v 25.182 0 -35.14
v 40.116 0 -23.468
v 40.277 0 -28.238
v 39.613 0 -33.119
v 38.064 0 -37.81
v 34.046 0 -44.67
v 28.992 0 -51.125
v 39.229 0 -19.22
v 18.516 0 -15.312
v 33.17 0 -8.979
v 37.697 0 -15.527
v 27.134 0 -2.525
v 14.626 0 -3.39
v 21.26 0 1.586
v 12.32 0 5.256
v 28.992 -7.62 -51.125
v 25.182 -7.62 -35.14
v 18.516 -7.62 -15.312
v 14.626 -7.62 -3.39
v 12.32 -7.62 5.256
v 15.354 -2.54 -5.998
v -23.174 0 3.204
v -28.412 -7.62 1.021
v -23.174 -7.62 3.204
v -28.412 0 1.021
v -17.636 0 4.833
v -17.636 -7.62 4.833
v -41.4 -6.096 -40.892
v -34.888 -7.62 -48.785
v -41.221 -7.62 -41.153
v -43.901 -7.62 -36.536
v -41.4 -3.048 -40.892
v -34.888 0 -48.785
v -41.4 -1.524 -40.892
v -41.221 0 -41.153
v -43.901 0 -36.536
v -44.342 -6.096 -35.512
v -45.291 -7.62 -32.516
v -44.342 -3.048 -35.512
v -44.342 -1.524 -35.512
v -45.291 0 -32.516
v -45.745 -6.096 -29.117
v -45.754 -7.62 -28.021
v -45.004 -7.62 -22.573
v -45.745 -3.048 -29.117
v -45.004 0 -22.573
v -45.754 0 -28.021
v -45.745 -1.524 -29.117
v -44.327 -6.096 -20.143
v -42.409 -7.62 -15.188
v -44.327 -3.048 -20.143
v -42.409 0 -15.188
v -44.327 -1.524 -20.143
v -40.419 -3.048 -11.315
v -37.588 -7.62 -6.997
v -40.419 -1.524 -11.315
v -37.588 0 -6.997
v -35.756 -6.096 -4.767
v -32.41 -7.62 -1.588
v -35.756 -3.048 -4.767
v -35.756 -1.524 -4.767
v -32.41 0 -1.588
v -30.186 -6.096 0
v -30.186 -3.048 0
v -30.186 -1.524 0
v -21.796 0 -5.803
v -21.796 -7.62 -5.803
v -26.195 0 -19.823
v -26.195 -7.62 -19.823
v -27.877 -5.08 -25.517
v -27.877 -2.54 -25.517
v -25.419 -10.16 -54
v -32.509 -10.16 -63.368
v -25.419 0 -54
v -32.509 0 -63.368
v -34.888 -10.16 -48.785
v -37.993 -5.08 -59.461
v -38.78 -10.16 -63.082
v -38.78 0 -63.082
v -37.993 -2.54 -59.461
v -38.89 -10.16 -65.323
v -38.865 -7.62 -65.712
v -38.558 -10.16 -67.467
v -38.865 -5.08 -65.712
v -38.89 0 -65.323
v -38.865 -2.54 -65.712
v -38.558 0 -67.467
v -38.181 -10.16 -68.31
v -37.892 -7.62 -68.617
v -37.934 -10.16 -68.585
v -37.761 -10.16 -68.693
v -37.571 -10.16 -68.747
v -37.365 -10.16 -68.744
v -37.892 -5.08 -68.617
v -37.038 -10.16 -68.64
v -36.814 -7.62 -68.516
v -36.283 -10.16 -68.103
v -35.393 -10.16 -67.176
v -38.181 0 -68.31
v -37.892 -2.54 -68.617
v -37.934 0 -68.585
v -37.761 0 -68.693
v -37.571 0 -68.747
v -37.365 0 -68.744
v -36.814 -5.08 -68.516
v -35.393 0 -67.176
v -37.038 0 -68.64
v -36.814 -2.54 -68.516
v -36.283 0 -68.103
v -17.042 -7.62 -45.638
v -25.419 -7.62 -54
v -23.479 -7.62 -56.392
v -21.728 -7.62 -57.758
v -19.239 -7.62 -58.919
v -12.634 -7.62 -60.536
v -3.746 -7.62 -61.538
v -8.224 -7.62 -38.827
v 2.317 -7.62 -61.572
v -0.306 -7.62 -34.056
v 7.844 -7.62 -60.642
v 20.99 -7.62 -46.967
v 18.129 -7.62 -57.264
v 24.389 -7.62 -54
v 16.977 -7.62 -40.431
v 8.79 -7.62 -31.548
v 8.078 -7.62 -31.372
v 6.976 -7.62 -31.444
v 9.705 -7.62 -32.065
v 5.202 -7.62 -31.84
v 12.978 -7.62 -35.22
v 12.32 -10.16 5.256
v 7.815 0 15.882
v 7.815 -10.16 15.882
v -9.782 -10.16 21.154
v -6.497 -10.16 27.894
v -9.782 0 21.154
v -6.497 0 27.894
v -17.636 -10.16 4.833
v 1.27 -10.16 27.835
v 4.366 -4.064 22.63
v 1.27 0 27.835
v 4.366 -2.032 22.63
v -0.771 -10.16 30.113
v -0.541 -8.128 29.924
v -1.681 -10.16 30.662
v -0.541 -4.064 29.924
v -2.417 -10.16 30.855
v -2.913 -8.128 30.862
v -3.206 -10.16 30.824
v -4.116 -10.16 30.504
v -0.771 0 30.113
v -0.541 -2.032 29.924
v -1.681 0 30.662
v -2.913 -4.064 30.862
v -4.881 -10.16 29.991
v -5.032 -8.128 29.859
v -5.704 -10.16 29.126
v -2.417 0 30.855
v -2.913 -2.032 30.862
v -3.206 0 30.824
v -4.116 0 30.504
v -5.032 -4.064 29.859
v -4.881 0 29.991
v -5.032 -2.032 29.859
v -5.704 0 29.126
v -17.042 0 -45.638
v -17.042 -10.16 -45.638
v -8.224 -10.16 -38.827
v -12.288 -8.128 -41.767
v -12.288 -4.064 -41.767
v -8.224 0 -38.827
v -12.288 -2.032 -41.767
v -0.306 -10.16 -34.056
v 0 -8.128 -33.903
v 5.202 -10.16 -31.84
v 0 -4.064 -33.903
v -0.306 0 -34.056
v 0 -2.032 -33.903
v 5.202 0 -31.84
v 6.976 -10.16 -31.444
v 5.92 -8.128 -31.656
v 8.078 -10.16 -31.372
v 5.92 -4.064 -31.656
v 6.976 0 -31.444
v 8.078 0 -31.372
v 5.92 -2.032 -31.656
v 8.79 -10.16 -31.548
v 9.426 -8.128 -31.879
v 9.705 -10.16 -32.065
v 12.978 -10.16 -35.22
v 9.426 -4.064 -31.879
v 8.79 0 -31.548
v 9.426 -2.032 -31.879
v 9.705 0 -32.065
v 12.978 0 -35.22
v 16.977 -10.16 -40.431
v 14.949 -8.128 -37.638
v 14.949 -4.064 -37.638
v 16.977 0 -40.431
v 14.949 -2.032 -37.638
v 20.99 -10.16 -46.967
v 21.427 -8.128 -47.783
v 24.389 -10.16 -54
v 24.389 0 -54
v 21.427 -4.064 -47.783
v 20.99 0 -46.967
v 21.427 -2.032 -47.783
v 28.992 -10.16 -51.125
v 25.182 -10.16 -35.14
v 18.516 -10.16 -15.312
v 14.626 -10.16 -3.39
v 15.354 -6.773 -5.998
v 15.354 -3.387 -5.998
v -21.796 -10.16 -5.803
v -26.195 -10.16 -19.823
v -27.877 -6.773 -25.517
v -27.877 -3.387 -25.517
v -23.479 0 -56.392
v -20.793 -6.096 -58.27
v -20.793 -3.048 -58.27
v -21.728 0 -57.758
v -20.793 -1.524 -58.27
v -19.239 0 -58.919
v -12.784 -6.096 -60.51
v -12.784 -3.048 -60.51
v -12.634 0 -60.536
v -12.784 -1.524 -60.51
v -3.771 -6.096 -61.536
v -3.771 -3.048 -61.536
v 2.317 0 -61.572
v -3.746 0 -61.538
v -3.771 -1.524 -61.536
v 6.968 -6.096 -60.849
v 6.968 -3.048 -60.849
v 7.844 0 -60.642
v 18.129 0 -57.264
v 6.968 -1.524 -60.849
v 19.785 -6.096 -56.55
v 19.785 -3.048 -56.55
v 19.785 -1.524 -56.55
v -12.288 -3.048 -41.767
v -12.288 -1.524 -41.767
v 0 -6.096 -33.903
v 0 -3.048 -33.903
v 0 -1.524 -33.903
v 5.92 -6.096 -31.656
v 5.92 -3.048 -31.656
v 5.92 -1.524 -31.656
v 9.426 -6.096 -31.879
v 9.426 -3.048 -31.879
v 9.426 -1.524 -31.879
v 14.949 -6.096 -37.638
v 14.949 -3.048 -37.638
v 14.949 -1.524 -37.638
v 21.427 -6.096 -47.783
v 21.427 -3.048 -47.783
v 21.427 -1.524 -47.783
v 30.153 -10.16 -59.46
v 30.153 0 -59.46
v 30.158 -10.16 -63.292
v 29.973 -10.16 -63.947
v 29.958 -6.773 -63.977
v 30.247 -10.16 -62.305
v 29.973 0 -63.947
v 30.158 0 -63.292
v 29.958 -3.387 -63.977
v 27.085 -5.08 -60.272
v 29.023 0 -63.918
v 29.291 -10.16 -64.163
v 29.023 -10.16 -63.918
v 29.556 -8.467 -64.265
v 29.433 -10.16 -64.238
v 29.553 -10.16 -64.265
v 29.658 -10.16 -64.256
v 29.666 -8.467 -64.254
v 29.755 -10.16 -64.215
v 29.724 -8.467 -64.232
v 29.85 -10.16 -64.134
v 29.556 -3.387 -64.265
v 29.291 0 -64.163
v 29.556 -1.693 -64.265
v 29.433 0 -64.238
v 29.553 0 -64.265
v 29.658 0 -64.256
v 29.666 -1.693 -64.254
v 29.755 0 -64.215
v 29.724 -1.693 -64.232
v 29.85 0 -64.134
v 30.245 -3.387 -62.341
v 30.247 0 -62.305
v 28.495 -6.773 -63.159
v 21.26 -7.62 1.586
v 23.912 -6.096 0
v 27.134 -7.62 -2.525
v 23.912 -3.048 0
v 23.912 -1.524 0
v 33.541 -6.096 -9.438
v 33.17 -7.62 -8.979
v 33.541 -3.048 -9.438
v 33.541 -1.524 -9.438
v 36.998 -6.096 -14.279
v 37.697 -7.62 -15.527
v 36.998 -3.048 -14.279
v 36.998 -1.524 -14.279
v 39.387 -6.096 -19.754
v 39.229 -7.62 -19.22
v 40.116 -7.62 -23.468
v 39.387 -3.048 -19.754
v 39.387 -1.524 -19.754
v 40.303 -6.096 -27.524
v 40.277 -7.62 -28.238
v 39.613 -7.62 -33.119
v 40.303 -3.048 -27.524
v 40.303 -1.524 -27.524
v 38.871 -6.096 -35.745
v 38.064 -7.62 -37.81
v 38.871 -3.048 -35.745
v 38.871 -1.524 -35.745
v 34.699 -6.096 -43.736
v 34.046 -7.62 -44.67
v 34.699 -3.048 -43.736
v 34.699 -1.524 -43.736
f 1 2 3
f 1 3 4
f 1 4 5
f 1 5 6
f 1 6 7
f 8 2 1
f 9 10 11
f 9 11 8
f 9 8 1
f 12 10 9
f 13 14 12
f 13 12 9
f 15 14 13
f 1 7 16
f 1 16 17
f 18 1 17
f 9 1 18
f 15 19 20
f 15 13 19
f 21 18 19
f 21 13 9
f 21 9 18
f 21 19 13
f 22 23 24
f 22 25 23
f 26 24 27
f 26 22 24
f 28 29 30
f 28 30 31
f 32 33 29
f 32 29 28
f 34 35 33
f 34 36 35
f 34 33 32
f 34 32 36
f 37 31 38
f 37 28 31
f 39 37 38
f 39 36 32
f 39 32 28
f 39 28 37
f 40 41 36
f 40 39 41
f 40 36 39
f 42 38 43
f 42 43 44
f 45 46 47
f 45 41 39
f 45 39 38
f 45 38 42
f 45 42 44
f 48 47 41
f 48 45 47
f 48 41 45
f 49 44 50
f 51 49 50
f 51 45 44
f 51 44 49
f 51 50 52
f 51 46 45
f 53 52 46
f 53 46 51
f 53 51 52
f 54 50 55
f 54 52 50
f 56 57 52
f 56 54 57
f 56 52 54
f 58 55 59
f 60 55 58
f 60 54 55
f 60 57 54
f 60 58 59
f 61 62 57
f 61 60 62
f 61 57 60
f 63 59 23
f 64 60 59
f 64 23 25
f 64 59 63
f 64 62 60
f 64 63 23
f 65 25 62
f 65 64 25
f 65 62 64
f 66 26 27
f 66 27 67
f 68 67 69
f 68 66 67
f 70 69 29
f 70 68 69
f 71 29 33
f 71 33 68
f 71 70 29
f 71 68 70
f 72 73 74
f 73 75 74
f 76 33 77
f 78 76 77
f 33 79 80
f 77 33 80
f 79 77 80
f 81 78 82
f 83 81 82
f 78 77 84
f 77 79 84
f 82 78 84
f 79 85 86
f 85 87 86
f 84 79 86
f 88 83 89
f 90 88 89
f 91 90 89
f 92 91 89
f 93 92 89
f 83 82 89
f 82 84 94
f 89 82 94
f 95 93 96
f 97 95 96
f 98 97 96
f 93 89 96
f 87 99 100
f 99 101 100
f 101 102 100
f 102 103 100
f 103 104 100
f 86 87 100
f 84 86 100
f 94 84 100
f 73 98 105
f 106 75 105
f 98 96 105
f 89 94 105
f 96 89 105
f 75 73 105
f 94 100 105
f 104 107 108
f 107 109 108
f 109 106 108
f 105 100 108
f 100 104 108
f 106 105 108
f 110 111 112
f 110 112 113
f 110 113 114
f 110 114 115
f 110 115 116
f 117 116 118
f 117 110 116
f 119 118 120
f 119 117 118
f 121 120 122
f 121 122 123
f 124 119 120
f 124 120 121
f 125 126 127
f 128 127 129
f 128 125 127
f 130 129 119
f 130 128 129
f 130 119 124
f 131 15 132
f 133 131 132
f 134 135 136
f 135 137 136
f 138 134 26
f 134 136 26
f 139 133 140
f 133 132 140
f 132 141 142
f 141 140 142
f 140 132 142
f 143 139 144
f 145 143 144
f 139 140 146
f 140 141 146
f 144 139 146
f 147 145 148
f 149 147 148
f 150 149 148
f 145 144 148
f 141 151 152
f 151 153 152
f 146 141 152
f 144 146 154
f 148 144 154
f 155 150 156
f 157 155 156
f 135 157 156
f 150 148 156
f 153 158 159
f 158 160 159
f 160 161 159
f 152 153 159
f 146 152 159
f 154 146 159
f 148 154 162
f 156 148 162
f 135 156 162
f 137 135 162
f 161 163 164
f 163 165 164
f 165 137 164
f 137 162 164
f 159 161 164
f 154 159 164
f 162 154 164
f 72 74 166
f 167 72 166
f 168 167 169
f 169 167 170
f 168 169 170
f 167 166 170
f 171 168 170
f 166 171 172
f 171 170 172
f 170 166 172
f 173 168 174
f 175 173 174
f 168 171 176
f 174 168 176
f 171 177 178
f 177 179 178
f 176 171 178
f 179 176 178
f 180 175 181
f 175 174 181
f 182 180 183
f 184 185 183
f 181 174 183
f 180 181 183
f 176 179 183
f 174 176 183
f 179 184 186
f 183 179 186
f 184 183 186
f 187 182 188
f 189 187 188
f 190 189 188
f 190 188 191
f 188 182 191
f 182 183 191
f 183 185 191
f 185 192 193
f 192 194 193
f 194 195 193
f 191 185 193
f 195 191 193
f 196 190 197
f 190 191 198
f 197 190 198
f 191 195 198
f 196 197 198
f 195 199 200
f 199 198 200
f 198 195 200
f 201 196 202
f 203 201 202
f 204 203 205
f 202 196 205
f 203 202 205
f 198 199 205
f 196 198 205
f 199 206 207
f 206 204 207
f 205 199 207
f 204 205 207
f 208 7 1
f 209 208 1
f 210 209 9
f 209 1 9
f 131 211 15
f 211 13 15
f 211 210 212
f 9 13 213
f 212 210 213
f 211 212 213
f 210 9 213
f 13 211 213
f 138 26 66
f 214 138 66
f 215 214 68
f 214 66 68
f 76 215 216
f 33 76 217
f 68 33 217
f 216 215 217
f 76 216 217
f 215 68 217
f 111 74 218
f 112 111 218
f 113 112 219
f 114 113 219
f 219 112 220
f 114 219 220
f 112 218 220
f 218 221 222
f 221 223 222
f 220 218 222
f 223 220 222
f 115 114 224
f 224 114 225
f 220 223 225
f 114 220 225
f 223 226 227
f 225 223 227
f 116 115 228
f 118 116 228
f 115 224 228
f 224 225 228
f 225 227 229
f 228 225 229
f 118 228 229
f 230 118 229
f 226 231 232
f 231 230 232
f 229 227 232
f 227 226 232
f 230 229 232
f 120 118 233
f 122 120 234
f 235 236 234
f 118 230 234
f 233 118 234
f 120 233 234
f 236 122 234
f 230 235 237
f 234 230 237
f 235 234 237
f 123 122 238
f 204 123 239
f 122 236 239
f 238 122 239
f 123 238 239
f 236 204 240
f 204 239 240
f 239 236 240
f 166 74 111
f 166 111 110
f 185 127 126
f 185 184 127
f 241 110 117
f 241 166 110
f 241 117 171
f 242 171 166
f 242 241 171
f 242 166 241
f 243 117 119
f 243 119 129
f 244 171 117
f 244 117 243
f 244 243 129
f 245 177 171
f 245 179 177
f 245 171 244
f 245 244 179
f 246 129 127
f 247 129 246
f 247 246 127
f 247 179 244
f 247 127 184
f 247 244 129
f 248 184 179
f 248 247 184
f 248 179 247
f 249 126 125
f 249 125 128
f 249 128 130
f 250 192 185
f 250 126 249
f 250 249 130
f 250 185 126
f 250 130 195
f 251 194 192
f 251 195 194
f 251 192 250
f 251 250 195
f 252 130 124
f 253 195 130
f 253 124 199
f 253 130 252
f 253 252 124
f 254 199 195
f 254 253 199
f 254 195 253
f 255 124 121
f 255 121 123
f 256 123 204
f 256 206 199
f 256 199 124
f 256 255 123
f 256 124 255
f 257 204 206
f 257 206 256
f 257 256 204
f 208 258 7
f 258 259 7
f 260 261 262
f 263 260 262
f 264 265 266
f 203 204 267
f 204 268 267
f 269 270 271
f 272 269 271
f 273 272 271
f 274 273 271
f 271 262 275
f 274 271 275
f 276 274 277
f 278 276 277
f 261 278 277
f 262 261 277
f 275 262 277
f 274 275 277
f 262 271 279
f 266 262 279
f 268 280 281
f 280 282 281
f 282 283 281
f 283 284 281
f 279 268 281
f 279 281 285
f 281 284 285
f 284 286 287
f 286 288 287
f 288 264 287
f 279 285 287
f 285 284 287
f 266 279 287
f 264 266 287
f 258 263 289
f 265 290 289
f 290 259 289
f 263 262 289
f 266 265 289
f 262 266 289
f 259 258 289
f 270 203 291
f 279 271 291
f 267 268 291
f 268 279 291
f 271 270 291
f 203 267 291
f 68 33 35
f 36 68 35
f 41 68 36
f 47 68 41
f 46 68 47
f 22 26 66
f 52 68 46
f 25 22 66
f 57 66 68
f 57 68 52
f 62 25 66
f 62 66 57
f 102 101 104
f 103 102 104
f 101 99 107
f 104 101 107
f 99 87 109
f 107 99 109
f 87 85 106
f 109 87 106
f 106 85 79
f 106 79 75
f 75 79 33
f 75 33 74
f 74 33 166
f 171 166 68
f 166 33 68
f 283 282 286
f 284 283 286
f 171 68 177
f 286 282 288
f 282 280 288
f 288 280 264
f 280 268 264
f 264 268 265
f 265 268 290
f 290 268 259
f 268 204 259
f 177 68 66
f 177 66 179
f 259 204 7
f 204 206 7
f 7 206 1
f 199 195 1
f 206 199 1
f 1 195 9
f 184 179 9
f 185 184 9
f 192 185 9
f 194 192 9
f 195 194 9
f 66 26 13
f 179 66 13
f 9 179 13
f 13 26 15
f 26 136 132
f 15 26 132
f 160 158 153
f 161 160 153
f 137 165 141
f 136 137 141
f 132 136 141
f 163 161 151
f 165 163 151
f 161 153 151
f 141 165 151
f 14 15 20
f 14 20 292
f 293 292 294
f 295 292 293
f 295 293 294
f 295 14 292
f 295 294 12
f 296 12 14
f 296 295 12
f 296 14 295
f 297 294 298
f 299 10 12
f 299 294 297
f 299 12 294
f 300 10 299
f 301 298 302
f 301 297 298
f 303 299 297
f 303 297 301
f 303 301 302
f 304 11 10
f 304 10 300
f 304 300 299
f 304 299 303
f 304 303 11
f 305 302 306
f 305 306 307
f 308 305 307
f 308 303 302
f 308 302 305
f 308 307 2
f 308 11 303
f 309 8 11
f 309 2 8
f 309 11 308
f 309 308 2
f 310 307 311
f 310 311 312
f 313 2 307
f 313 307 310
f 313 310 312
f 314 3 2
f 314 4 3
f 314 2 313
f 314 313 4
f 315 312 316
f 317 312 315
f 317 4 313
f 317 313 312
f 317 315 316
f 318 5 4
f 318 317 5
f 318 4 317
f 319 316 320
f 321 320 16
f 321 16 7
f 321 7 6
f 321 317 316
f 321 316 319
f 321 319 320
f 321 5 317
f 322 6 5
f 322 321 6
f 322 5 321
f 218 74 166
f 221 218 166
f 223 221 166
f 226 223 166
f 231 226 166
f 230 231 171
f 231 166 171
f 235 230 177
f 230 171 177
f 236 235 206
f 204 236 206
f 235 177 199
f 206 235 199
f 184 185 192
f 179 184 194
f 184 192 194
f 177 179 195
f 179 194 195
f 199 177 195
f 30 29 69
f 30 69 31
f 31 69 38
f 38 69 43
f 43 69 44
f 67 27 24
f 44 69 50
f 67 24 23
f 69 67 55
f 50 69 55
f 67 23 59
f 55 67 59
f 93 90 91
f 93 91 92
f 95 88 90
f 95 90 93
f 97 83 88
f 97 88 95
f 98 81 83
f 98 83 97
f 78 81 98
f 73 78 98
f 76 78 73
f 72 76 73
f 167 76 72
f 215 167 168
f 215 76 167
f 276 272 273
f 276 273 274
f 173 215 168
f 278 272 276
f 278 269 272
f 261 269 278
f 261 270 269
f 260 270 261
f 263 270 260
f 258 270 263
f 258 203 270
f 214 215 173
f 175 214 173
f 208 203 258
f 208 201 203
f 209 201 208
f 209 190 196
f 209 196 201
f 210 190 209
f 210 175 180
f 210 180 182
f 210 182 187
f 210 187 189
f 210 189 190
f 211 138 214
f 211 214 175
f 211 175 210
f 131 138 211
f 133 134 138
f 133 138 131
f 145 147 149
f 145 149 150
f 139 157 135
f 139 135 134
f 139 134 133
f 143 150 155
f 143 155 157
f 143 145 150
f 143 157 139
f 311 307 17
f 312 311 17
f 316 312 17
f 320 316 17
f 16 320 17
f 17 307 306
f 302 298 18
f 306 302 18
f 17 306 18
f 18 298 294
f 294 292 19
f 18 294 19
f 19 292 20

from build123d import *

# Parameters (mm, degrees)
F1_DEPTH = 10.16
F2_DEPTH = 7.62


# Not quite as in the source:
# - a feature names something its author has since deleted; it is built from what else it names


with BuildPart() as f1:
    # F0 (on Front) → F1 (new body)
    with BuildSketch(Plane.XZ):
        with BuildLine():
            add(Edge.make_bspline(
                [(28.992260687, -51.125045095), (28.3542685584, -47.6041133313), (24.5731440192, -30.3142446822), (14.6542496305, -6.5082500378), (13.6472214399, 1.3233310586), (12.3196523637, 5.2555091679)],
                knots=[0.8432322735, 0.8432322735, 0.8432322735, 0.8432322735, 0.8677839764, 0.9518885045, 1, 1, 1, 1], degree=3))
            add(Edge.make_bspline(
                [(12.3196523637, 5.2555091679), (10.61980651, 10.290348239), (4.9500571604, 22.0767618937), (-0.9757985337, 31.9404522882), (-5.7479640246, 30.0120107701), (-8.2004857079, 23.9136843789), (-14.3824154124, 12.2416093831), (-17.6358987441, 4.8334208231)],
                knots=[0, 0, 0, 0, 0.0616029159, 0.1066291224, 0.1322179197, 0.1677258873, 0.2305197427, 0.2305197427, 0.2305197427, 0.2305197427], degree=3))
            add(Edge.make_bspline(
                [(-17.6358987441, 4.8334208231), (-17.9733857287, 4.0649622317), (-22.1836405162, -5.7326263077), (-26.4141695975, -20.9824695343), (-32.763153948, -41.7024504699), (-34.8875297492, -48.7852445916)],
                knots=[0.2305197427, 0.2305197427, 0.2305197427, 0.2305197427, 0.2370334103, 0.3136224027, 0.3682900919, 0.3682900919, 0.3682900919, 0.3682900919], degree=3))
            add(Edge.make_bspline(
                [(-34.8875297492, -48.7852445916), (-35.9471827463, -52.3181901349), (-38.2300866389, -60.0434285284), (-39.3566173352, -64.8119959688), (-37.4131760235, -72.2791048189), (-31.4341899312, -61.0313718112), (-25.4187397659, -54.0002956986)],
                knots=[0.3682900919, 0.3682900919, 0.3682900919, 0.3682900919, 0.3955587045, 0.4352066461, 0.460820021, 0.5224171012, 0.5224171012, 0.5224171012, 0.5224171012], degree=3))
            add(Edge.make_bspline(
                [(-25.4187397659, -54.0002956986), (-17.5845607261, -44.8434233791), (-1.5173266758, -33.6024762984), (6.7694707164, -31.3366153102), (10.2385672181, -31.2173267791), (18.9153870863, -42.0630767436), (23.5009052342, -51.982604528), (24.3885566757, -54.0002956986)],
                knots=[0.5224171012, 0.5224171012, 0.5224171012, 0.5224171012, 0.6026376236, 0.6409454024, 0.6632093958, 0.7261128605, 0.7433427512, 0.7433427512, 0.7433427512, 0.7433427512], degree=3))
            add(Edge.make_bspline(
                [(24.3885566757, -54.0002956986), (26.5903478901, -59.0051145786), (28.6394317601, -64.5177765642), (30.7238087214, -64.1336863489), (30.1629437266, -57.5857754307), (28.992260687, -51.125045095)],
                knots=[0.7433427512, 0.7433427512, 0.7433427512, 0.7433427512, 0.7860809481, 0.7981811499, 0.8432322735, 0.8432322735, 0.8432322735, 0.8432322735], degree=3))
        make_face()
    extrude(amount=F1_DEPTH)


with BuildPart() as f2:
    # F0 (on Front) → F2 (new body)
    with BuildSketch(Plane.XZ):
        with BuildLine():
            add(Edge.make_bspline(
                [(12.3196523637, 5.2555091679), (16.3293673506, 3.8357811983), (24.4648018895, 0.9552851882), (33.8214083274, -9.3522210684), (40.7356141666, -19.286508233), (40.6472321133, -36.8598470106), (32.9719946095, -46.2663130218), (28.992260687, -51.125045095)],
                knots=[0, 0, 0, 0, 0.1881816106, 0.3818643701, 0.5635006279, 0.7744831849, 1, 1, 1, 1], degree=3))
            add(Edge.make_bspline(
                [(28.992260687, -51.125045095), (28.3542685584, -47.6041133313), (24.5731440192, -30.3142446822), (14.6542496305, -6.5082500378), (13.6472214399, 1.3233310586), (12.3196523637, 5.2555091679)],
                knots=[0.8432322735, 0.8432322735, 0.8432322735, 0.8432322735, 0.8677839764, 0.9518885045, 1, 1, 1, 1], degree=3))
        make_face()
    extrude(amount=F2_DEPTH)


with BuildPart() as f2b:
    # F0 (on Front) → F2, piece 2 (new body)
    with BuildSketch(Plane.XZ):
        with BuildLine():
            add(Edge.make_bspline(
                [(-25.4187397659, -54.0002956986), (-24.3165414563, -55.5440490563), (-21.3853374114, -59.6495317512), (-3.0994731674, -61.9540870824), (6.3787545796, -61.5581423049), (19.8107127549, -56.901060642), (23.1179069318, -54.8054468343), (24.3885566757, -54.0002956986)],
                knots=[0, 0, 0, 0, 0.1575601247, 0.4190179487, 0.6250340965, 0.8559351814, 1, 1, 1, 1], degree=3))
            add(Edge.make_bspline(
                [(-25.4187397659, -54.0002956986), (-17.5845607261, -44.8434233791), (-1.5173266758, -33.6024762984), (6.7694707164, -31.3366153102), (10.2385672181, -31.2173267791), (18.9153870863, -42.0630767436), (23.5009052342, -51.982604528), (24.3885566757, -54.0002956986)],
                knots=[0.5224171012, 0.5224171012, 0.5224171012, 0.5224171012, 0.6026376236, 0.6409454024, 0.6632093958, 0.7261128605, 0.7433427512, 0.7433427512, 0.7433427512, 0.7433427512], degree=3))
        make_face()
    extrude(amount=F2_DEPTH)


with BuildPart() as f2c:
    # F0 (on Front) → F2, piece 3 (new body)
    with BuildSketch(Plane.XZ):
        with BuildLine():
            add(Edge.make_bspline(
                [(-17.6358987441, 4.8334208231), (-17.9733857287, 4.0649622317), (-22.1836405162, -5.7326263077), (-26.4141695975, -20.9824695343), (-32.763153948, -41.7024504699), (-34.8875297492, -48.7852445916)],
                knots=[0.2305197427, 0.2305197427, 0.2305197427, 0.2305197427, 0.2370334103, 0.3136224027, 0.3682900919, 0.3682900919, 0.3682900919, 0.3682900919], degree=3))
            add(Edge.make_bspline(
                [(-34.8875297492, -48.7852445916), (-37.1597512143, -46.3154286709), (-41.8636352624, -41.1162261119), (-47.9460775261, -29.0291237763), (-41.3344862222, -10.6386963733), (-31.0370320647, 1.0641410772), (-22.053409524, 3.6380541687), (-17.6358987441, 4.8334208231)],
                knots=[0, 0, 0, 0, 0.1717500879, 0.3619580647, 0.5933974335, 0.8031046848, 1, 1, 1, 1], degree=3))
        make_face()
    extrude(amount=F2_DEPTH)


solid = Compound([f1.part, f2.part, f2b.part, f2c.part])
